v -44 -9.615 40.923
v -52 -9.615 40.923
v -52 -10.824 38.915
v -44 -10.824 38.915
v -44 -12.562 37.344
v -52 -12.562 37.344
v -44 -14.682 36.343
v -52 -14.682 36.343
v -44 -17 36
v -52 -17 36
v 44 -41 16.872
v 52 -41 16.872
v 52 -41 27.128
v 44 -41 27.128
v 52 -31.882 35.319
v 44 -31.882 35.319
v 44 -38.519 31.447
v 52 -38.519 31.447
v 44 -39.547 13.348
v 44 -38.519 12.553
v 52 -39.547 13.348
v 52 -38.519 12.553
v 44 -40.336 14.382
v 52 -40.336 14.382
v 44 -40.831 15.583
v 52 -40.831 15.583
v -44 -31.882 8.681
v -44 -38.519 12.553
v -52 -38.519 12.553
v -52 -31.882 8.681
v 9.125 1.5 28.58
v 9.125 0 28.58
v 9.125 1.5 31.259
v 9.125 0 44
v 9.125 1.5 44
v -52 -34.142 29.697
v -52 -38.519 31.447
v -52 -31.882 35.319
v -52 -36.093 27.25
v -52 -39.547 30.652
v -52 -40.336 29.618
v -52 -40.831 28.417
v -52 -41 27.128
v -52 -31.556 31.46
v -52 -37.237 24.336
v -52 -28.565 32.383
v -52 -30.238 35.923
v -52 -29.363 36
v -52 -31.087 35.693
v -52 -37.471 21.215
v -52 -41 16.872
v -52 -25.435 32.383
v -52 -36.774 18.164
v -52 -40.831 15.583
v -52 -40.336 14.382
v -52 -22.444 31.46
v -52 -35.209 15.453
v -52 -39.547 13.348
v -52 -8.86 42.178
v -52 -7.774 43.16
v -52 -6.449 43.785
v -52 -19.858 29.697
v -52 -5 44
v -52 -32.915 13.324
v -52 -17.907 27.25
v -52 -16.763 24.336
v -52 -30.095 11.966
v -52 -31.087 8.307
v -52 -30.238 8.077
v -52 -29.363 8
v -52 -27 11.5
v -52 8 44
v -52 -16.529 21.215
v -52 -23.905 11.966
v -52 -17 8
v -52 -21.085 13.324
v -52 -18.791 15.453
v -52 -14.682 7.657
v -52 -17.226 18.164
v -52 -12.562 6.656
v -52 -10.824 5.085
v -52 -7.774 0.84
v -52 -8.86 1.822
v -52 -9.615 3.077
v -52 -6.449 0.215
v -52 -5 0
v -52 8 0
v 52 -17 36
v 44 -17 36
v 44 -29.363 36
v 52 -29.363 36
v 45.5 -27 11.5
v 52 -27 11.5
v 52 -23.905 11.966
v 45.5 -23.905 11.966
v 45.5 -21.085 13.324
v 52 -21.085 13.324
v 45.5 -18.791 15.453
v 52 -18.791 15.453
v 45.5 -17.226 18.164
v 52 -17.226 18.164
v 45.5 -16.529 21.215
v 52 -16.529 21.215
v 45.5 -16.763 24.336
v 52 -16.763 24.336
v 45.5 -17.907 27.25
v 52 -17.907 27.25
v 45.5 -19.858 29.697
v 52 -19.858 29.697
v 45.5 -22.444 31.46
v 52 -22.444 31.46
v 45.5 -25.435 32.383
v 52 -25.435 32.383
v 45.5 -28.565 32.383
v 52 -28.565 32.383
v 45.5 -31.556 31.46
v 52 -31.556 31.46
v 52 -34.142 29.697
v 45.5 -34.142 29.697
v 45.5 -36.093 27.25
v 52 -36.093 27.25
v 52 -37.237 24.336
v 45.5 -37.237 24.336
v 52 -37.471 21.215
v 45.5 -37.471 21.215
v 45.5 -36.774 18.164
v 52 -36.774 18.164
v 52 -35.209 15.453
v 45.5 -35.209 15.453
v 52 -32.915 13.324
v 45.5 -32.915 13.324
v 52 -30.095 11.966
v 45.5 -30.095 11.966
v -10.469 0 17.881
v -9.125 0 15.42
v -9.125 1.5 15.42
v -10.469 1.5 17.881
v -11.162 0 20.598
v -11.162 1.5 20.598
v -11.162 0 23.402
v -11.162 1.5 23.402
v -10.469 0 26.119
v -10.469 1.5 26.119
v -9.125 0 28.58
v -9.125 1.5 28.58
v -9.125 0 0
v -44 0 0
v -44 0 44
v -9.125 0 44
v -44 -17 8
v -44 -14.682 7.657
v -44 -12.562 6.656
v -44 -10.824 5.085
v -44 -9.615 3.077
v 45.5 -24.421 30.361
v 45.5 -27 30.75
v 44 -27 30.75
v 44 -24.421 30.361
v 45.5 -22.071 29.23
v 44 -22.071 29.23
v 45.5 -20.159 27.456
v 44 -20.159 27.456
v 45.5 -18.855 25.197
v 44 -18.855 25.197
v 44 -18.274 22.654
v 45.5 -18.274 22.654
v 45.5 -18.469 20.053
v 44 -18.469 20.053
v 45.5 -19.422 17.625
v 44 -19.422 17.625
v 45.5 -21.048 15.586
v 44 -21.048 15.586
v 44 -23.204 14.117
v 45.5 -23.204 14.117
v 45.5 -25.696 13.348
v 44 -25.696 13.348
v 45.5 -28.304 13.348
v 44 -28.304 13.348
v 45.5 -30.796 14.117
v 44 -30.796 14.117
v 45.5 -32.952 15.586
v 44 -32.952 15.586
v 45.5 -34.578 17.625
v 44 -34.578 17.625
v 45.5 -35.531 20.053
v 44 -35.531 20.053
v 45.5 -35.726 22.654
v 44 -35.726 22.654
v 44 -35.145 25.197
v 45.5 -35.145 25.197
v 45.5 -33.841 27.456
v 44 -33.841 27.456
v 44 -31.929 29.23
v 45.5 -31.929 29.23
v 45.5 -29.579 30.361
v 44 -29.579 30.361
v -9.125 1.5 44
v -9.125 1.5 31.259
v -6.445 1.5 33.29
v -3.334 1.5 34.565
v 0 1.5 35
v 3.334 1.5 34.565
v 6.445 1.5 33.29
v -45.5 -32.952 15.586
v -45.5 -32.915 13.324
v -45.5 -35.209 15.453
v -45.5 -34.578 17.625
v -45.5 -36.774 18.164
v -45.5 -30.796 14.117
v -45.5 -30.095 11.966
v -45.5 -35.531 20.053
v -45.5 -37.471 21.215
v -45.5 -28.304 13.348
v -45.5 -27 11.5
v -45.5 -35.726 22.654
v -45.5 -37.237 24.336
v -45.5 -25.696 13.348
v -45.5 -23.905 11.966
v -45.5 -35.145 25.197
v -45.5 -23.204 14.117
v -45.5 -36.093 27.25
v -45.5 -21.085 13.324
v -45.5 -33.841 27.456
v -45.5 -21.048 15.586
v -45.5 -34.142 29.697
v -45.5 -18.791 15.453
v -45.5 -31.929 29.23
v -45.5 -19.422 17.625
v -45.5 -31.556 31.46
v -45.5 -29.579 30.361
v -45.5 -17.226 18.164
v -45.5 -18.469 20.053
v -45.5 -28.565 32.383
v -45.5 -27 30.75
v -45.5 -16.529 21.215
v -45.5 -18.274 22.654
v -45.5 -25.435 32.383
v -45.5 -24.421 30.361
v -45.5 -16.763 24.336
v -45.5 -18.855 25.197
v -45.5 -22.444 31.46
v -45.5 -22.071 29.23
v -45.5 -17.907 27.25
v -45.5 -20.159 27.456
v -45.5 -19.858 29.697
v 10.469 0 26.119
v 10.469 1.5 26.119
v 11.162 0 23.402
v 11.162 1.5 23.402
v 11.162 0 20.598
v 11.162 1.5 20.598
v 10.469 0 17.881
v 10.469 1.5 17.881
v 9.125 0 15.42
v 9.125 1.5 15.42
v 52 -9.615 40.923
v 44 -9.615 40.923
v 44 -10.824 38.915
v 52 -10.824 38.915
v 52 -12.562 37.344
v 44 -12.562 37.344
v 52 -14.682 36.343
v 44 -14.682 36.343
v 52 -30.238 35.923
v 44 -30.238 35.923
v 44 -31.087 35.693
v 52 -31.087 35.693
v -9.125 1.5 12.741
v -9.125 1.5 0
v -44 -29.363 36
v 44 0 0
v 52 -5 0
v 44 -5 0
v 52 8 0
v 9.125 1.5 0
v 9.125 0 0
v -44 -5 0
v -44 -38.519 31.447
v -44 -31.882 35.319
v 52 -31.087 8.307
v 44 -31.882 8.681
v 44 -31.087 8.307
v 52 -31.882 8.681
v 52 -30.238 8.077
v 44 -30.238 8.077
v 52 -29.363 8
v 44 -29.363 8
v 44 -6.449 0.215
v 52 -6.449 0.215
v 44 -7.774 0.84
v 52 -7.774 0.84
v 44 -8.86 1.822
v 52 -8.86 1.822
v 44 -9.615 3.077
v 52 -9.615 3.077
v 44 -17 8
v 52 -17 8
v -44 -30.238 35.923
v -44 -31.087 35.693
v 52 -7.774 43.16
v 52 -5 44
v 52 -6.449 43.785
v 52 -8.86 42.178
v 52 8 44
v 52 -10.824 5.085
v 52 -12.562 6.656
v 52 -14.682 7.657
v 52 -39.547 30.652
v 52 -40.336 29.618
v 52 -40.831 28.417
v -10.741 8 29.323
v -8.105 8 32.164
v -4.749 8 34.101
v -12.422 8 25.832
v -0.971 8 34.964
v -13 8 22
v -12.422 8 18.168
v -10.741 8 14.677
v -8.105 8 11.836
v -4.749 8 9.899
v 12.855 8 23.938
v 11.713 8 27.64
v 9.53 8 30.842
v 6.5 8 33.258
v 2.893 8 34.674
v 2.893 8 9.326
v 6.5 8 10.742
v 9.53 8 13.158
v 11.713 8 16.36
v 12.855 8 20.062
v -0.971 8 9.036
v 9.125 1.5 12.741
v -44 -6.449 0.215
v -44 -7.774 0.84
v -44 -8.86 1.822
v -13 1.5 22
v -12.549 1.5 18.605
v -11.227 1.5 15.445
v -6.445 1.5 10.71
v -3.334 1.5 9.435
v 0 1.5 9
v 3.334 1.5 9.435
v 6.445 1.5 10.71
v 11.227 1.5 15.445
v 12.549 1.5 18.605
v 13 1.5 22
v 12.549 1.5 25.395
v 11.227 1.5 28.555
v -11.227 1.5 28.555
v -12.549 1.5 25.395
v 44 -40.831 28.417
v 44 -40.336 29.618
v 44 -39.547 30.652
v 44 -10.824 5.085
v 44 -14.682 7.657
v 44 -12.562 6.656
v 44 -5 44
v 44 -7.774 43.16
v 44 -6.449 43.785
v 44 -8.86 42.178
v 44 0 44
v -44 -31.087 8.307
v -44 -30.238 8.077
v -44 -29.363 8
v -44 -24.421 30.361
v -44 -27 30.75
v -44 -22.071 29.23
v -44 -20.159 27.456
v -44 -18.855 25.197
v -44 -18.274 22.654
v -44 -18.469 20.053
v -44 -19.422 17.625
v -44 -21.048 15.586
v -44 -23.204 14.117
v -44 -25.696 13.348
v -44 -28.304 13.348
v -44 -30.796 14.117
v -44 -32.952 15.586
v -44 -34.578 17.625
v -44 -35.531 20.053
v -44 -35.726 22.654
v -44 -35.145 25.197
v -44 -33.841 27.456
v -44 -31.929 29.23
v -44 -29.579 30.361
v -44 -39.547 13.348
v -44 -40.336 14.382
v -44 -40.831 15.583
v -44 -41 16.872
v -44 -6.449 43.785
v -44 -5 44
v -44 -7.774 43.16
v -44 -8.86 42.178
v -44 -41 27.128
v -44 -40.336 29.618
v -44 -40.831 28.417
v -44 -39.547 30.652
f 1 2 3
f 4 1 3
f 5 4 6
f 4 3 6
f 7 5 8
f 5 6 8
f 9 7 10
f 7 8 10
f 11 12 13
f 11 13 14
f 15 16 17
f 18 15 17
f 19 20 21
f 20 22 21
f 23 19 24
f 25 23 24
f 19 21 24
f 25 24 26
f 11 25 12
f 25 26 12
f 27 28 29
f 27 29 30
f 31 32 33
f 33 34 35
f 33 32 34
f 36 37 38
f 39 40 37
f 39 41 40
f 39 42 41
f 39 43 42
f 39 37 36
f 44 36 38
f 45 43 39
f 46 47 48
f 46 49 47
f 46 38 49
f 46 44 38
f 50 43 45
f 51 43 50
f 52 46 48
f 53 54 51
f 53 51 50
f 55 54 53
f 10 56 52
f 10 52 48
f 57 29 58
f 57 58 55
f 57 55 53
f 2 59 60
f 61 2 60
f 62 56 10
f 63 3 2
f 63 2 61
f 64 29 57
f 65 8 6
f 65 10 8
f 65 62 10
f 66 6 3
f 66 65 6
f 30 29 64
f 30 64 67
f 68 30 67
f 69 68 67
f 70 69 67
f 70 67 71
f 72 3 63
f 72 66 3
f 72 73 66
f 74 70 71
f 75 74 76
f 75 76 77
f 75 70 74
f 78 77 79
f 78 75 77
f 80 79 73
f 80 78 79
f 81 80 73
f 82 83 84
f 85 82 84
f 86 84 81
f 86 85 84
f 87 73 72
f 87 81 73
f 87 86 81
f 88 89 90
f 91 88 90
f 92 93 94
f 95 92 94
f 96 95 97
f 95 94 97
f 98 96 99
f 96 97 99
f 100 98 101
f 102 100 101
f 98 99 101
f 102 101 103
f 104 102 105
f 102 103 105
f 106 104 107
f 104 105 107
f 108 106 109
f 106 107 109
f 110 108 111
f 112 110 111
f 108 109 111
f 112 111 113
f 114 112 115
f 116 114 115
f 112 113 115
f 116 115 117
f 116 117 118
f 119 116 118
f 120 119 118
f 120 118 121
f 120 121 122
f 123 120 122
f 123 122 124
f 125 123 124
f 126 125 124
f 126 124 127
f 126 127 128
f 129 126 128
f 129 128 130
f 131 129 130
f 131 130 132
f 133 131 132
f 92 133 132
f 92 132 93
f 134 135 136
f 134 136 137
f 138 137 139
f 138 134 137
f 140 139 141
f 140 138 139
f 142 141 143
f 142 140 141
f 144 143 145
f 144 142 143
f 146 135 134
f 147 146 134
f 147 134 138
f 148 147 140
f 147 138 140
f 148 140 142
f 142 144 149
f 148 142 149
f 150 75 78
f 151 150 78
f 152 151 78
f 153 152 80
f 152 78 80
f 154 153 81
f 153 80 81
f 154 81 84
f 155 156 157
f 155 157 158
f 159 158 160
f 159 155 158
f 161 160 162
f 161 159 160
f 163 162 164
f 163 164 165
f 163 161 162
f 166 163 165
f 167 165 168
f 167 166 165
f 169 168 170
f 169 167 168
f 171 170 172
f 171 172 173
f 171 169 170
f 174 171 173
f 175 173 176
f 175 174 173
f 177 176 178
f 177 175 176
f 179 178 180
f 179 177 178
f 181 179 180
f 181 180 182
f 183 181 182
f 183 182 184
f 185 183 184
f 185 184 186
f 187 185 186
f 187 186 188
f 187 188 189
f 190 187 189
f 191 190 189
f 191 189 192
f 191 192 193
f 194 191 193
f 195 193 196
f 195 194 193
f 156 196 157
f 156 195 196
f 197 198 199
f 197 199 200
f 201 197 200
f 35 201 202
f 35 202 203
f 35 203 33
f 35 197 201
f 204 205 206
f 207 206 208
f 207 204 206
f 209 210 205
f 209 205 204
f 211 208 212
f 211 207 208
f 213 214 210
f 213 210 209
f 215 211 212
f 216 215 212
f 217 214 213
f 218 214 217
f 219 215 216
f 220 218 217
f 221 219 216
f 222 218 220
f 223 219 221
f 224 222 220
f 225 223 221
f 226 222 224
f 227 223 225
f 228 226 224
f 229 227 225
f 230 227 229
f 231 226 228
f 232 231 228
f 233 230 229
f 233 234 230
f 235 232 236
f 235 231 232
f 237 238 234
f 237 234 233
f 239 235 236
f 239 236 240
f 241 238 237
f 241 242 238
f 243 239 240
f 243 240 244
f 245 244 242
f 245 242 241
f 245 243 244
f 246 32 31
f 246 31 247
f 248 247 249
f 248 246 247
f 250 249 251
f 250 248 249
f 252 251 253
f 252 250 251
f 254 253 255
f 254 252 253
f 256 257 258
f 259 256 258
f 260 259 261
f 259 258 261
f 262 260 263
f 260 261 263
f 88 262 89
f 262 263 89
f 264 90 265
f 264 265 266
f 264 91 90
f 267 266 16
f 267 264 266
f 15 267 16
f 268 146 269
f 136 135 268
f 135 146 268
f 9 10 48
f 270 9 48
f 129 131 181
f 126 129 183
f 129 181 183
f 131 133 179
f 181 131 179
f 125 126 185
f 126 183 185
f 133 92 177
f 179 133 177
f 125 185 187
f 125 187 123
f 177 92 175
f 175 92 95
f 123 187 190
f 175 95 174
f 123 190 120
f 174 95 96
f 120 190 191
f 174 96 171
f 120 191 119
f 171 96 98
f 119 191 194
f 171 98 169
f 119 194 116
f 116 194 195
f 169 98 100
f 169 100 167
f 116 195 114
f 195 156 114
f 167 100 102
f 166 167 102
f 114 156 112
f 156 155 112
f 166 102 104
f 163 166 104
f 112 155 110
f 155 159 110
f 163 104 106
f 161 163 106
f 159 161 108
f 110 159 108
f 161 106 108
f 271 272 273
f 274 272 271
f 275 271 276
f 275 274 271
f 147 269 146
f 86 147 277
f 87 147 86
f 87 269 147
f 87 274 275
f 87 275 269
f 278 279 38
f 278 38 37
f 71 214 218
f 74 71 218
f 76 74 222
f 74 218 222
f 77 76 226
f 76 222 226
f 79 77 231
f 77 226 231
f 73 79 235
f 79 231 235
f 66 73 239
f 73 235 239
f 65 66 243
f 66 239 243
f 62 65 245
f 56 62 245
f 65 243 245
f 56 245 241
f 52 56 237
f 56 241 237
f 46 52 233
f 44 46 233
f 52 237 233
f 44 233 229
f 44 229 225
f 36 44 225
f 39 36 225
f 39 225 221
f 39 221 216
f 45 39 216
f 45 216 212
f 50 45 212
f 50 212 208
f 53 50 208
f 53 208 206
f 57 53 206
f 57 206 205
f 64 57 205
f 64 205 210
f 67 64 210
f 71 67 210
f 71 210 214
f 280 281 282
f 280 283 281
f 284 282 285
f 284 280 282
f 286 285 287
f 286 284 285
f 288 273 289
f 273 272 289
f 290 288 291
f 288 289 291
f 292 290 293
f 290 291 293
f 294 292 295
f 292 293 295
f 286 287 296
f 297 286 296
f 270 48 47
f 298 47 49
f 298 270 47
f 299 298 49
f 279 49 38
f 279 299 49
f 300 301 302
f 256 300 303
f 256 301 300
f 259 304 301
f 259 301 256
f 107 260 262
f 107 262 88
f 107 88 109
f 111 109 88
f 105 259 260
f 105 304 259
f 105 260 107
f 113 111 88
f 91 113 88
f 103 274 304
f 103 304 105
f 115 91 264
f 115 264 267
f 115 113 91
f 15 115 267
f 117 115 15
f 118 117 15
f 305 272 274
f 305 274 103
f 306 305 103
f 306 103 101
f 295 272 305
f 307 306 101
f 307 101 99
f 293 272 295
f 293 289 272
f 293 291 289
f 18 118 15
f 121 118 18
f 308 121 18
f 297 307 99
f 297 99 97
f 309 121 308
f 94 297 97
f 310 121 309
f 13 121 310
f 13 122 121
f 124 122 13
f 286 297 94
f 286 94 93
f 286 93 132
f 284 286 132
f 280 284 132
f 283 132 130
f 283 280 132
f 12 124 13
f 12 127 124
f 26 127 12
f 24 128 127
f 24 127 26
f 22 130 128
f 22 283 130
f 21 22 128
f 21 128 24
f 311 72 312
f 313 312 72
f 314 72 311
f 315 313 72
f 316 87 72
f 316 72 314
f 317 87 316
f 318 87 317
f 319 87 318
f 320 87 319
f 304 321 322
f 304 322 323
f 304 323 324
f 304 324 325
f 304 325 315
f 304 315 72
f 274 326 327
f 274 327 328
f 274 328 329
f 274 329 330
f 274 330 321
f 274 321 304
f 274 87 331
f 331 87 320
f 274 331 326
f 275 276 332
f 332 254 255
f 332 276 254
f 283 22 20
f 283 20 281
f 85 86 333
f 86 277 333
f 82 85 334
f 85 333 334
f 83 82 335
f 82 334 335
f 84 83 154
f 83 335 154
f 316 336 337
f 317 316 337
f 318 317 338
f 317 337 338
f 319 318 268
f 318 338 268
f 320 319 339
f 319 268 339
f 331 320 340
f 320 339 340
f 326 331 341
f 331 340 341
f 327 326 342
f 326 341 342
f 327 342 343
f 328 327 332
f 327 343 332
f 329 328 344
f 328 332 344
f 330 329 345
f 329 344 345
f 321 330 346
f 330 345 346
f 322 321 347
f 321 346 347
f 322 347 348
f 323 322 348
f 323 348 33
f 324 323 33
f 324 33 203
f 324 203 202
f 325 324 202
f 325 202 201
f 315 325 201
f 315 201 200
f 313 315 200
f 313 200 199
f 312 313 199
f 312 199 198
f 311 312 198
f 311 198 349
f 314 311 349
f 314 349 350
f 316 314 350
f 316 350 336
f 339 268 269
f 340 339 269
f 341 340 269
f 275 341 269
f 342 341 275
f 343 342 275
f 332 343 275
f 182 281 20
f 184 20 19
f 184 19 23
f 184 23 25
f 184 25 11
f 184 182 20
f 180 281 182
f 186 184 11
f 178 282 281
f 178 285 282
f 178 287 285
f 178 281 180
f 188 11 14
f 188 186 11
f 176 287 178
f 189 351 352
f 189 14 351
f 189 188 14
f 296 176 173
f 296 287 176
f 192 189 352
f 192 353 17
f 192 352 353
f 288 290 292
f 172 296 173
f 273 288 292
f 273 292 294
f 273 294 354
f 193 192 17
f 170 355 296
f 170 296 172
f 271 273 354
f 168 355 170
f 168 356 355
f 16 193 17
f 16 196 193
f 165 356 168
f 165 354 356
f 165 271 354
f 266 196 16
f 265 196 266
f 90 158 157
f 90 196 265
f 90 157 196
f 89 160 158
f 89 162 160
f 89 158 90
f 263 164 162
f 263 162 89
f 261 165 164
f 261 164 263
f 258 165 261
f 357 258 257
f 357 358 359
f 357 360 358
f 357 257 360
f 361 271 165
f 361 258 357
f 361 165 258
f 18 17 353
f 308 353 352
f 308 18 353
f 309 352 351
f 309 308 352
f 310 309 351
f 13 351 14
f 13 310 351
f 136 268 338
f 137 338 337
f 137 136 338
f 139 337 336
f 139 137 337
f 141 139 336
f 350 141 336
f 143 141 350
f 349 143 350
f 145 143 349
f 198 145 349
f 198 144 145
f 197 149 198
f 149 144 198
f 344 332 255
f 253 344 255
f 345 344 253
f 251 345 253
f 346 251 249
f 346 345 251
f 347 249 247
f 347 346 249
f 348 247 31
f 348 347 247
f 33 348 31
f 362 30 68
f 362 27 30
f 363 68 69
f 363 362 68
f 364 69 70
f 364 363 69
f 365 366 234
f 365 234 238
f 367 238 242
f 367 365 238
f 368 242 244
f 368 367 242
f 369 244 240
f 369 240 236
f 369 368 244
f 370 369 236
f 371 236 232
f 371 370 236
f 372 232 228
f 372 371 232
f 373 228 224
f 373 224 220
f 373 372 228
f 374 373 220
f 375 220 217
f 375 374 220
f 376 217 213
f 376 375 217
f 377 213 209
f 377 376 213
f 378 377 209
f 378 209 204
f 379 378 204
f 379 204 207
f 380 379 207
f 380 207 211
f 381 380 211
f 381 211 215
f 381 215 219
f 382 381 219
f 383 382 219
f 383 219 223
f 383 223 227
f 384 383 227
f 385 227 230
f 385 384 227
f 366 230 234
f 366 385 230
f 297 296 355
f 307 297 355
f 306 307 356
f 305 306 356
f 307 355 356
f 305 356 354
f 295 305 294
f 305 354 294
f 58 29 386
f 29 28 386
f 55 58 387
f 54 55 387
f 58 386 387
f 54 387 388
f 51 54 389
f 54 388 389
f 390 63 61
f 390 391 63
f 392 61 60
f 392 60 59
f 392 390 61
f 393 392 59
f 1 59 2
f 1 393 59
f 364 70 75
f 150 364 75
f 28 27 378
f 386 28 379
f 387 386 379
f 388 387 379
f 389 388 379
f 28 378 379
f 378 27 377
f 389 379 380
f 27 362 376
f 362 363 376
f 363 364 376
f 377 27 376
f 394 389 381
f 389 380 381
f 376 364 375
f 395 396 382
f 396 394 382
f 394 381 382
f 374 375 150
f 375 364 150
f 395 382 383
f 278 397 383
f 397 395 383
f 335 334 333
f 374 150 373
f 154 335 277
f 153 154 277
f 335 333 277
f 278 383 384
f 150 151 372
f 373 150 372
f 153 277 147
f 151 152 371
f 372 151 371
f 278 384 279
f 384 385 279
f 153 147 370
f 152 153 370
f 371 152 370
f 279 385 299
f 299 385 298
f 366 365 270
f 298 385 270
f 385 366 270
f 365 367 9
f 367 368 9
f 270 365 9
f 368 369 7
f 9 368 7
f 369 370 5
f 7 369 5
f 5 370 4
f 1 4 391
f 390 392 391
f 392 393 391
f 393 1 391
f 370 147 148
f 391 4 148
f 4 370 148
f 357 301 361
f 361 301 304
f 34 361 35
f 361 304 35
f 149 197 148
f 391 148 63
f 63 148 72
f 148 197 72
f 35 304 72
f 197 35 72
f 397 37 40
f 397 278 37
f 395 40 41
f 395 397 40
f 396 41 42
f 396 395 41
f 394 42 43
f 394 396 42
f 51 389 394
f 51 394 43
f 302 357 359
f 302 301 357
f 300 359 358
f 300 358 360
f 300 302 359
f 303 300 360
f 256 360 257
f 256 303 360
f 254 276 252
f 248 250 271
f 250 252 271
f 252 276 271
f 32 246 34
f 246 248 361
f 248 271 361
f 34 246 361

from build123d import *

# Parameters (mm, degrees)
BOSS_EXTRUDE1_DEPTH        = 44
F_21_0_21_DIAMETER_HOLE1_D = 21
F_26_0_26_DIAMETER_HOLE1_D = 26
BOSS_EXTRUDE2_START        = -1.5
SKETCH9_R                  = 10.5
SKETCH9_R_2                = 8.75
BOSS_EXTRUDE2_DEPTH        = 1.5
BOSS_EXTRUDE3_START        = 88
SKETCH9_2_R                = 10.5
SKETCH9_2_R_2              = 8.75
BOSS_EXTRUDE3_DEPTH        = 1.5
SKETCH16_R                 = 13
SKETCH16_R_2               = 11.25
BOSS_EXTRUDE4_DEPTH        = 1.5
SKETCH17_W                 = 18.25
SKETCH17_H                 = 1.5
CUT_EXTRUDE1_DEPTH         = 80.504716841
CUT_EXTRUDE3_DEPTH         = 121.137421314
FILLET3_R                  = 5


with BuildPart() as part:
    # Sketch1 → Boss-Extrude1 (new body)
    with BuildSketch(Plane.XY):
        Polygon((44, 0), (-44, 0), (-44, -41), (-52, -41), (-52, 8), (52, 8), (52, -41), (44, -41), align=None)
    extrude(amount=BOSS_EXTRUDE1_DEPTH)

    # Ø21.0 (21) Diameter Hole1 (through all)
    with Locations(Plane.ZY.offset(52)):
        with Locations((22, -27)):
            Hole(F_21_0_21_DIAMETER_HOLE1_D / 2)

    # Ø26.0 (26) Diameter Hole1 (through all)
    with Locations(Plane(origin=(0, 8, 0), x_dir=(1, 0, 0), z_dir=(0, 1, 0))):
        with Locations((0, -22)):
            Hole(F_26_0_26_DIAMETER_HOLE1_D / 2)

    # Sketch9 → Boss-Extrude2 (add)
    with BuildSketch(Plane.ZY.offset(-44).offset(BOSS_EXTRUDE2_START)):
        with Locations((22, -27)):
            Circle(SKETCH9_R)
        with Locations((22, -27)):
            Circle(SKETCH9_R_2, mode=Mode.SUBTRACT)
    extrude(amount=BOSS_EXTRUDE2_DEPTH)

    # Sketch9<2> → Boss-Extrude3 (add)
    with BuildSketch(Plane.ZY.offset(-44).offset(BOSS_EXTRUDE3_START)):
        with Locations((22, -27)):
            Circle(SKETCH9_2_R)
        with Locations((22, -27)):
            Circle(SKETCH9_2_R_2, mode=Mode.SUBTRACT)
    extrude(amount=BOSS_EXTRUDE3_DEPTH)

    # Sketch16 → Boss-Extrude4 (add)
    with BuildSketch(Plane(origin=(0, 0, 0), x_dir=(1, 0, 0), z_dir=(0, 1, 0))):
        with Locations(Location((0, -22, 0), (0, 0, 270))):
            Circle(SKETCH16_R)
        with Locations(Location((0, -22, 0), (0, 0, 270))):
            Circle(SKETCH16_R_2, mode=Mode.SUBTRACT)
    extrude(amount=BOSS_EXTRUDE4_DEPTH)

    # Sketch17 → Cut-Extrude1 (cut, through all)
    with BuildSketch(Plane.XY.offset(44)):
        with Locations((0, 0.75)):
            Rectangle(SKETCH17_W, SKETCH17_H)
    extrude(amount=-CUT_EXTRUDE1_DEPTH, mode=Mode.SUBTRACT)

    # Sketch19 → Cut-Extrude3 (cut, through all)
    with BuildSketch(Plane.ZY.offset(52)):
        with BuildLine():
            ThreePointArc((0, -25), (2.087839834, -24.722753708), (4.030968204, -23.910231207))
            Line((4.030968204, -23.910231207), (0, -17))
            Line((0, -17), (0, -25))
        make_face()
        with BuildLine():
            Line((0, -17), (4.030968204, -23.910231207))
            ThreePointArc((4.030968204, -23.910231207), (6.937137221, -20.984485812), (8, -17))
            ThreePointArc((8, -17), (5.656854249, -11.343145751), (0, -9))
            Line((0, -9), (0, -17))
        make_face()
        with BuildLine():
            Line((14, -41), (8, -30.714285714))
            Line((8, -30.714285714), (4.030968204, -23.910231207))
            ThreePointArc((4.030968204, -23.910231207), (2.087839834, -24.722753708), (0, -25))
            Line((0, -25), (0, -41))
            Line((0, -41), (14, -41))
        make_face()
        with BuildLine():
            Line((4.030968204, -23.910231207), (8, -30.714285714))
            Line((8, -30.714285714), (8, -17))
            ThreePointArc((8, -17), (6.937137221, -20.984485812), (4.030968204, -23.910231207))
        make_face()
        with BuildLine():
            Line((36, -17), (36, -30.714285714))
            Line((36, -30.714285714), (39.969031796, -23.910231207))
            ThreePointArc((39.969031796, -23.910231207), (37.062862779, -20.984485812), (36, -17))
        make_face()
        with BuildLine():
            ThreePointArc((39.969031796, -23.910231207), (41.912160166, -24.722753708), (44, -25))
            Line((44, -25), (44, -17))
            Line((44, -17), (39.969031796, -23.910231207))
        make_face()
        with BuildLine():
            ThreePointArc((44, -9), (38.343145751, -11.343145751), (36, -17))
            ThreePointArc((36, -17), (37.062862779, -20.984485812), (39.969031796, -23.910231207))
            Line((39.969031796, -23.910231207), (44, -17))
            Line((44, -17), (44, -9))
        make_face()
        with BuildLine():
            Line((36, -30.714285714), (30, -41))
            Line((30, -41), (44, -41))
            Line((44, -41), (44, -25))
            ThreePointArc((44, -25), (41.912160166, -24.722753708), (39.969031796, -23.910231207))
            Line((39.969031796, -23.910231207), (36, -30.714285714))
        make_face()
    extrude(amount=-CUT_EXTRUDE3_DEPTH, mode=Mode.SUBTRACT)

    # Fillet3
    fillet3_edges = [part.edges().sort_by_distance(p)[0] for p in [
        (48, -9, 0),
        (-48, -9, 0),
        (-48, -9, 44),
        (48, -9, 44),
        (-48, -30.714285714, 36),
        (48, -30.714285714, 36),
        (-48, -41, 30),
        (48, -41, 30),
        (-48, -30.714285714, 8),
        (48, -30.714285714, 8),
        (-48, -41, 14),
        (48, -41, 14),
    ]]
    fillet(fillet3_edges, radius=FILLET3_R)


solid = part.part
